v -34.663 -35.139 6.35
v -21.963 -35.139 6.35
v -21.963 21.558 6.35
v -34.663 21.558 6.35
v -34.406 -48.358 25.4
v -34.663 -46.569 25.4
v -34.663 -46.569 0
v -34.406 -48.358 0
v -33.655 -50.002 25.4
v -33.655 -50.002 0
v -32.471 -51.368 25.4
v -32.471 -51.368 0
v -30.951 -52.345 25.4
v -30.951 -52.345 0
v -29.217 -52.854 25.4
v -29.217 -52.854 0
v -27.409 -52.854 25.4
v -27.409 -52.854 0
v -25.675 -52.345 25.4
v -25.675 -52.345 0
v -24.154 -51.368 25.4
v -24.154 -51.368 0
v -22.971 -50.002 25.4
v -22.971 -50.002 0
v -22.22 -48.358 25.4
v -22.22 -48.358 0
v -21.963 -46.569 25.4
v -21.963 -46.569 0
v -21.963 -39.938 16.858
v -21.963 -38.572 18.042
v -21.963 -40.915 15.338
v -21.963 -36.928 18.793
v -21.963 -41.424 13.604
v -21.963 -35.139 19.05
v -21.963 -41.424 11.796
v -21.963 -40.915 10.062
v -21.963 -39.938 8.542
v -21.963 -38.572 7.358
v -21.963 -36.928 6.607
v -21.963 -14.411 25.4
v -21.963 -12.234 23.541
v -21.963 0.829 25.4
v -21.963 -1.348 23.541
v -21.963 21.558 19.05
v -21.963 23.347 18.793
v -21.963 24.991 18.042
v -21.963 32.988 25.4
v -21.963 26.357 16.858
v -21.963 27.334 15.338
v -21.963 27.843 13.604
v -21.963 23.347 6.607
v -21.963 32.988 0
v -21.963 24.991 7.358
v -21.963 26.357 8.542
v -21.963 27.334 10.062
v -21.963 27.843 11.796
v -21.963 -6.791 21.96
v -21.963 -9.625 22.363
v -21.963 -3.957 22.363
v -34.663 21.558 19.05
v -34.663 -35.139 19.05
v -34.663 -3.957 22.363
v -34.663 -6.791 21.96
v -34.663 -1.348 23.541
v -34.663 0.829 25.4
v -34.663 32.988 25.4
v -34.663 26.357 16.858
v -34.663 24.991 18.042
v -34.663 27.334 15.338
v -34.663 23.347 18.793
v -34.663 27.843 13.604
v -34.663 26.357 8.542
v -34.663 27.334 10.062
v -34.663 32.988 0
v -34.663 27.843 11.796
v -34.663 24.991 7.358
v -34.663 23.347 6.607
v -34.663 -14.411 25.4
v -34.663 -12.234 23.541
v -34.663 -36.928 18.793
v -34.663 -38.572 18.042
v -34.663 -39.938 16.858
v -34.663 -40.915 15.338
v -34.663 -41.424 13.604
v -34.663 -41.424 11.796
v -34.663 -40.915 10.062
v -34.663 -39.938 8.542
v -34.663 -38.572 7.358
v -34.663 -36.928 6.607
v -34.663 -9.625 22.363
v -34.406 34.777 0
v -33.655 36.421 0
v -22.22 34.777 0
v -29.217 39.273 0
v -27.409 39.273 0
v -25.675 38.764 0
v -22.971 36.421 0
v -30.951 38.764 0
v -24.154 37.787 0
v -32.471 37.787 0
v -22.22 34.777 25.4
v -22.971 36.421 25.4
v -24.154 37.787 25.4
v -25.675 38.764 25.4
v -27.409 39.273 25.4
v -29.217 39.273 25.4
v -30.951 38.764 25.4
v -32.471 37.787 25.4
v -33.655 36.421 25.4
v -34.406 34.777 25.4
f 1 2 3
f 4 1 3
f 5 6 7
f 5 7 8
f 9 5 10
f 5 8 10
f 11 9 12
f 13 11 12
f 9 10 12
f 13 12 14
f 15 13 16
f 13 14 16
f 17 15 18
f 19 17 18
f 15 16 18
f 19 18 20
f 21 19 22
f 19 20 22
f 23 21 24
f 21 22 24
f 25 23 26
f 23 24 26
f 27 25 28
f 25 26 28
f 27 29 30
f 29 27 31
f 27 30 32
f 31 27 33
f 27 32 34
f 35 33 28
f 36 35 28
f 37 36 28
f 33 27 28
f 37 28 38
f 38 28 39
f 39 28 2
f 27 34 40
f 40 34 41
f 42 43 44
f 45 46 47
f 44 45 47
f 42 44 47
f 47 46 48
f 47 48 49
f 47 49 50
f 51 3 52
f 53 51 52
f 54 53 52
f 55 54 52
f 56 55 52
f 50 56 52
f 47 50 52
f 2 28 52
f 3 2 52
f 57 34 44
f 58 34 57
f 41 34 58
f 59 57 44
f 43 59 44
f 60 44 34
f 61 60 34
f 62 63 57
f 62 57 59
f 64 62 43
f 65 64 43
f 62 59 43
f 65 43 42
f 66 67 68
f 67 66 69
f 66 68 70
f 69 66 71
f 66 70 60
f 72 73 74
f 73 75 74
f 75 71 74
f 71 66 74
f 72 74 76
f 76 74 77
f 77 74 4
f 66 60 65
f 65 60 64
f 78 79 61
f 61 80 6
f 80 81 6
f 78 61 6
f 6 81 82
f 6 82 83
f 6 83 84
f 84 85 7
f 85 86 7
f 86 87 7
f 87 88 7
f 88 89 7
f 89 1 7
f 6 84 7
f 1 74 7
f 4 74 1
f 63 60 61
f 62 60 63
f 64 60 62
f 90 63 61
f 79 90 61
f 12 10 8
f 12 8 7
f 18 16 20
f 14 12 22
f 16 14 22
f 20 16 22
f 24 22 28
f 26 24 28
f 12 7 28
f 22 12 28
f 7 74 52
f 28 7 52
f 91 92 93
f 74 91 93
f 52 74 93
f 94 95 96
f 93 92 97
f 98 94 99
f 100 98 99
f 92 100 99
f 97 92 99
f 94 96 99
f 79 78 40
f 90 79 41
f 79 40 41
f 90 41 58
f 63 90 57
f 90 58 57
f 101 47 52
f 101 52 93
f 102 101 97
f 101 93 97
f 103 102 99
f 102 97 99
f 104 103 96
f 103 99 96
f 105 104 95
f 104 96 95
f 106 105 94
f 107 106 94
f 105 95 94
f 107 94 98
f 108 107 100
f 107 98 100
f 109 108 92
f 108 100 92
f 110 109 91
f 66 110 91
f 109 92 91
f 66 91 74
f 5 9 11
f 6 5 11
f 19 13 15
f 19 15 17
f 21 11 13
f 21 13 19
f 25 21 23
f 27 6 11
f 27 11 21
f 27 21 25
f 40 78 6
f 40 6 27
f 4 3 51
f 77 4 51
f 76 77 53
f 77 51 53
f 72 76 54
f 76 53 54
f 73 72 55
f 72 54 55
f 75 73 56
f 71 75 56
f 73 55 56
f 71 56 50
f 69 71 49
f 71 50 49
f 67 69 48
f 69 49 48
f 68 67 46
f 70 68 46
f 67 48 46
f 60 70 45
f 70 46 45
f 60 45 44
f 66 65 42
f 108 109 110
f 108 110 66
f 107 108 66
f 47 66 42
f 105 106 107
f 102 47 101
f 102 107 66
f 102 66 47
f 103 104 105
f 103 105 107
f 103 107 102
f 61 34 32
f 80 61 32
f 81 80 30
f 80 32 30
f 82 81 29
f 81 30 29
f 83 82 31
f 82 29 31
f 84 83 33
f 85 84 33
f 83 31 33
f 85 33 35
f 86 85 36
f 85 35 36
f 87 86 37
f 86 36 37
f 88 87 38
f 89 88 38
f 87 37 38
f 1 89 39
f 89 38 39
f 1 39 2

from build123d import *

# Parameters (mm, degrees)
F1_DEPTH = 25.4
F3_DEPTH = 25.4
F5_DEPTH = 25.4


with BuildPart() as f1:
    # F0 (on Top) → F1 (new body)
    with BuildSketch(Plane.XY):
        with BuildLine():
            Line((-34.662835, 32.987532), (-34.662835, -46.569009))
            ThreePointArc((-34.662835, -46.569009), (-28.312835, -52.919009), (-21.962835, -46.569009))
            Line((-21.962835, -46.569009), (-21.962835, 32.987532))
            ThreePointArc((-21.962835, 32.987532), (-28.312835, 39.337532), (-34.662835, 32.987532))
        make_face()
    extrude(amount=F1_DEPTH)

    # F2 (on face) → F3 (cut)
    with BuildSketch(Plane.YZ.offset(-21.962835)):
        with BuildLine():
            Line((21.557532, 19.05), (-35.139009, 19.05))
            ThreePointArc((-35.139009, 19.05), (-41.489009, 12.7), (-35.139009, 6.35))
            Line((-35.139009, 6.35), (21.557532, 6.35))
            ThreePointArc((21.557532, 6.35), (27.907532, 12.7), (21.557532, 19.05))
        make_face()
    extrude(amount=-F3_DEPTH, mode=Mode.SUBTRACT)

    # F4 (on face) → F5 (cut)
    with BuildSketch(Plane.YZ.offset(-21.962835)):
        with BuildLine():
            Line((0.829262, 25.4), (-6.790738, 25.4))
            Line((-6.790738, 25.4), (-6.790738, 21.960208))
            ThreePointArc((-6.790738, 21.960208), (-2.61053, 22.86), (0.829262, 25.4))
        make_face()
        with BuildLine():
            Line((-6.790738, 21.960208), (-6.790738, 25.4))
            Line((-6.790738, 25.4), (-14.410738, 25.4))
            ThreePointArc((-14.410738, 25.4), (-10.970946, 22.86), (-6.790738, 21.960208))
        make_face()
    extrude(amount=-F5_DEPTH, mode=Mode.SUBTRACT)


solid = f1.part
